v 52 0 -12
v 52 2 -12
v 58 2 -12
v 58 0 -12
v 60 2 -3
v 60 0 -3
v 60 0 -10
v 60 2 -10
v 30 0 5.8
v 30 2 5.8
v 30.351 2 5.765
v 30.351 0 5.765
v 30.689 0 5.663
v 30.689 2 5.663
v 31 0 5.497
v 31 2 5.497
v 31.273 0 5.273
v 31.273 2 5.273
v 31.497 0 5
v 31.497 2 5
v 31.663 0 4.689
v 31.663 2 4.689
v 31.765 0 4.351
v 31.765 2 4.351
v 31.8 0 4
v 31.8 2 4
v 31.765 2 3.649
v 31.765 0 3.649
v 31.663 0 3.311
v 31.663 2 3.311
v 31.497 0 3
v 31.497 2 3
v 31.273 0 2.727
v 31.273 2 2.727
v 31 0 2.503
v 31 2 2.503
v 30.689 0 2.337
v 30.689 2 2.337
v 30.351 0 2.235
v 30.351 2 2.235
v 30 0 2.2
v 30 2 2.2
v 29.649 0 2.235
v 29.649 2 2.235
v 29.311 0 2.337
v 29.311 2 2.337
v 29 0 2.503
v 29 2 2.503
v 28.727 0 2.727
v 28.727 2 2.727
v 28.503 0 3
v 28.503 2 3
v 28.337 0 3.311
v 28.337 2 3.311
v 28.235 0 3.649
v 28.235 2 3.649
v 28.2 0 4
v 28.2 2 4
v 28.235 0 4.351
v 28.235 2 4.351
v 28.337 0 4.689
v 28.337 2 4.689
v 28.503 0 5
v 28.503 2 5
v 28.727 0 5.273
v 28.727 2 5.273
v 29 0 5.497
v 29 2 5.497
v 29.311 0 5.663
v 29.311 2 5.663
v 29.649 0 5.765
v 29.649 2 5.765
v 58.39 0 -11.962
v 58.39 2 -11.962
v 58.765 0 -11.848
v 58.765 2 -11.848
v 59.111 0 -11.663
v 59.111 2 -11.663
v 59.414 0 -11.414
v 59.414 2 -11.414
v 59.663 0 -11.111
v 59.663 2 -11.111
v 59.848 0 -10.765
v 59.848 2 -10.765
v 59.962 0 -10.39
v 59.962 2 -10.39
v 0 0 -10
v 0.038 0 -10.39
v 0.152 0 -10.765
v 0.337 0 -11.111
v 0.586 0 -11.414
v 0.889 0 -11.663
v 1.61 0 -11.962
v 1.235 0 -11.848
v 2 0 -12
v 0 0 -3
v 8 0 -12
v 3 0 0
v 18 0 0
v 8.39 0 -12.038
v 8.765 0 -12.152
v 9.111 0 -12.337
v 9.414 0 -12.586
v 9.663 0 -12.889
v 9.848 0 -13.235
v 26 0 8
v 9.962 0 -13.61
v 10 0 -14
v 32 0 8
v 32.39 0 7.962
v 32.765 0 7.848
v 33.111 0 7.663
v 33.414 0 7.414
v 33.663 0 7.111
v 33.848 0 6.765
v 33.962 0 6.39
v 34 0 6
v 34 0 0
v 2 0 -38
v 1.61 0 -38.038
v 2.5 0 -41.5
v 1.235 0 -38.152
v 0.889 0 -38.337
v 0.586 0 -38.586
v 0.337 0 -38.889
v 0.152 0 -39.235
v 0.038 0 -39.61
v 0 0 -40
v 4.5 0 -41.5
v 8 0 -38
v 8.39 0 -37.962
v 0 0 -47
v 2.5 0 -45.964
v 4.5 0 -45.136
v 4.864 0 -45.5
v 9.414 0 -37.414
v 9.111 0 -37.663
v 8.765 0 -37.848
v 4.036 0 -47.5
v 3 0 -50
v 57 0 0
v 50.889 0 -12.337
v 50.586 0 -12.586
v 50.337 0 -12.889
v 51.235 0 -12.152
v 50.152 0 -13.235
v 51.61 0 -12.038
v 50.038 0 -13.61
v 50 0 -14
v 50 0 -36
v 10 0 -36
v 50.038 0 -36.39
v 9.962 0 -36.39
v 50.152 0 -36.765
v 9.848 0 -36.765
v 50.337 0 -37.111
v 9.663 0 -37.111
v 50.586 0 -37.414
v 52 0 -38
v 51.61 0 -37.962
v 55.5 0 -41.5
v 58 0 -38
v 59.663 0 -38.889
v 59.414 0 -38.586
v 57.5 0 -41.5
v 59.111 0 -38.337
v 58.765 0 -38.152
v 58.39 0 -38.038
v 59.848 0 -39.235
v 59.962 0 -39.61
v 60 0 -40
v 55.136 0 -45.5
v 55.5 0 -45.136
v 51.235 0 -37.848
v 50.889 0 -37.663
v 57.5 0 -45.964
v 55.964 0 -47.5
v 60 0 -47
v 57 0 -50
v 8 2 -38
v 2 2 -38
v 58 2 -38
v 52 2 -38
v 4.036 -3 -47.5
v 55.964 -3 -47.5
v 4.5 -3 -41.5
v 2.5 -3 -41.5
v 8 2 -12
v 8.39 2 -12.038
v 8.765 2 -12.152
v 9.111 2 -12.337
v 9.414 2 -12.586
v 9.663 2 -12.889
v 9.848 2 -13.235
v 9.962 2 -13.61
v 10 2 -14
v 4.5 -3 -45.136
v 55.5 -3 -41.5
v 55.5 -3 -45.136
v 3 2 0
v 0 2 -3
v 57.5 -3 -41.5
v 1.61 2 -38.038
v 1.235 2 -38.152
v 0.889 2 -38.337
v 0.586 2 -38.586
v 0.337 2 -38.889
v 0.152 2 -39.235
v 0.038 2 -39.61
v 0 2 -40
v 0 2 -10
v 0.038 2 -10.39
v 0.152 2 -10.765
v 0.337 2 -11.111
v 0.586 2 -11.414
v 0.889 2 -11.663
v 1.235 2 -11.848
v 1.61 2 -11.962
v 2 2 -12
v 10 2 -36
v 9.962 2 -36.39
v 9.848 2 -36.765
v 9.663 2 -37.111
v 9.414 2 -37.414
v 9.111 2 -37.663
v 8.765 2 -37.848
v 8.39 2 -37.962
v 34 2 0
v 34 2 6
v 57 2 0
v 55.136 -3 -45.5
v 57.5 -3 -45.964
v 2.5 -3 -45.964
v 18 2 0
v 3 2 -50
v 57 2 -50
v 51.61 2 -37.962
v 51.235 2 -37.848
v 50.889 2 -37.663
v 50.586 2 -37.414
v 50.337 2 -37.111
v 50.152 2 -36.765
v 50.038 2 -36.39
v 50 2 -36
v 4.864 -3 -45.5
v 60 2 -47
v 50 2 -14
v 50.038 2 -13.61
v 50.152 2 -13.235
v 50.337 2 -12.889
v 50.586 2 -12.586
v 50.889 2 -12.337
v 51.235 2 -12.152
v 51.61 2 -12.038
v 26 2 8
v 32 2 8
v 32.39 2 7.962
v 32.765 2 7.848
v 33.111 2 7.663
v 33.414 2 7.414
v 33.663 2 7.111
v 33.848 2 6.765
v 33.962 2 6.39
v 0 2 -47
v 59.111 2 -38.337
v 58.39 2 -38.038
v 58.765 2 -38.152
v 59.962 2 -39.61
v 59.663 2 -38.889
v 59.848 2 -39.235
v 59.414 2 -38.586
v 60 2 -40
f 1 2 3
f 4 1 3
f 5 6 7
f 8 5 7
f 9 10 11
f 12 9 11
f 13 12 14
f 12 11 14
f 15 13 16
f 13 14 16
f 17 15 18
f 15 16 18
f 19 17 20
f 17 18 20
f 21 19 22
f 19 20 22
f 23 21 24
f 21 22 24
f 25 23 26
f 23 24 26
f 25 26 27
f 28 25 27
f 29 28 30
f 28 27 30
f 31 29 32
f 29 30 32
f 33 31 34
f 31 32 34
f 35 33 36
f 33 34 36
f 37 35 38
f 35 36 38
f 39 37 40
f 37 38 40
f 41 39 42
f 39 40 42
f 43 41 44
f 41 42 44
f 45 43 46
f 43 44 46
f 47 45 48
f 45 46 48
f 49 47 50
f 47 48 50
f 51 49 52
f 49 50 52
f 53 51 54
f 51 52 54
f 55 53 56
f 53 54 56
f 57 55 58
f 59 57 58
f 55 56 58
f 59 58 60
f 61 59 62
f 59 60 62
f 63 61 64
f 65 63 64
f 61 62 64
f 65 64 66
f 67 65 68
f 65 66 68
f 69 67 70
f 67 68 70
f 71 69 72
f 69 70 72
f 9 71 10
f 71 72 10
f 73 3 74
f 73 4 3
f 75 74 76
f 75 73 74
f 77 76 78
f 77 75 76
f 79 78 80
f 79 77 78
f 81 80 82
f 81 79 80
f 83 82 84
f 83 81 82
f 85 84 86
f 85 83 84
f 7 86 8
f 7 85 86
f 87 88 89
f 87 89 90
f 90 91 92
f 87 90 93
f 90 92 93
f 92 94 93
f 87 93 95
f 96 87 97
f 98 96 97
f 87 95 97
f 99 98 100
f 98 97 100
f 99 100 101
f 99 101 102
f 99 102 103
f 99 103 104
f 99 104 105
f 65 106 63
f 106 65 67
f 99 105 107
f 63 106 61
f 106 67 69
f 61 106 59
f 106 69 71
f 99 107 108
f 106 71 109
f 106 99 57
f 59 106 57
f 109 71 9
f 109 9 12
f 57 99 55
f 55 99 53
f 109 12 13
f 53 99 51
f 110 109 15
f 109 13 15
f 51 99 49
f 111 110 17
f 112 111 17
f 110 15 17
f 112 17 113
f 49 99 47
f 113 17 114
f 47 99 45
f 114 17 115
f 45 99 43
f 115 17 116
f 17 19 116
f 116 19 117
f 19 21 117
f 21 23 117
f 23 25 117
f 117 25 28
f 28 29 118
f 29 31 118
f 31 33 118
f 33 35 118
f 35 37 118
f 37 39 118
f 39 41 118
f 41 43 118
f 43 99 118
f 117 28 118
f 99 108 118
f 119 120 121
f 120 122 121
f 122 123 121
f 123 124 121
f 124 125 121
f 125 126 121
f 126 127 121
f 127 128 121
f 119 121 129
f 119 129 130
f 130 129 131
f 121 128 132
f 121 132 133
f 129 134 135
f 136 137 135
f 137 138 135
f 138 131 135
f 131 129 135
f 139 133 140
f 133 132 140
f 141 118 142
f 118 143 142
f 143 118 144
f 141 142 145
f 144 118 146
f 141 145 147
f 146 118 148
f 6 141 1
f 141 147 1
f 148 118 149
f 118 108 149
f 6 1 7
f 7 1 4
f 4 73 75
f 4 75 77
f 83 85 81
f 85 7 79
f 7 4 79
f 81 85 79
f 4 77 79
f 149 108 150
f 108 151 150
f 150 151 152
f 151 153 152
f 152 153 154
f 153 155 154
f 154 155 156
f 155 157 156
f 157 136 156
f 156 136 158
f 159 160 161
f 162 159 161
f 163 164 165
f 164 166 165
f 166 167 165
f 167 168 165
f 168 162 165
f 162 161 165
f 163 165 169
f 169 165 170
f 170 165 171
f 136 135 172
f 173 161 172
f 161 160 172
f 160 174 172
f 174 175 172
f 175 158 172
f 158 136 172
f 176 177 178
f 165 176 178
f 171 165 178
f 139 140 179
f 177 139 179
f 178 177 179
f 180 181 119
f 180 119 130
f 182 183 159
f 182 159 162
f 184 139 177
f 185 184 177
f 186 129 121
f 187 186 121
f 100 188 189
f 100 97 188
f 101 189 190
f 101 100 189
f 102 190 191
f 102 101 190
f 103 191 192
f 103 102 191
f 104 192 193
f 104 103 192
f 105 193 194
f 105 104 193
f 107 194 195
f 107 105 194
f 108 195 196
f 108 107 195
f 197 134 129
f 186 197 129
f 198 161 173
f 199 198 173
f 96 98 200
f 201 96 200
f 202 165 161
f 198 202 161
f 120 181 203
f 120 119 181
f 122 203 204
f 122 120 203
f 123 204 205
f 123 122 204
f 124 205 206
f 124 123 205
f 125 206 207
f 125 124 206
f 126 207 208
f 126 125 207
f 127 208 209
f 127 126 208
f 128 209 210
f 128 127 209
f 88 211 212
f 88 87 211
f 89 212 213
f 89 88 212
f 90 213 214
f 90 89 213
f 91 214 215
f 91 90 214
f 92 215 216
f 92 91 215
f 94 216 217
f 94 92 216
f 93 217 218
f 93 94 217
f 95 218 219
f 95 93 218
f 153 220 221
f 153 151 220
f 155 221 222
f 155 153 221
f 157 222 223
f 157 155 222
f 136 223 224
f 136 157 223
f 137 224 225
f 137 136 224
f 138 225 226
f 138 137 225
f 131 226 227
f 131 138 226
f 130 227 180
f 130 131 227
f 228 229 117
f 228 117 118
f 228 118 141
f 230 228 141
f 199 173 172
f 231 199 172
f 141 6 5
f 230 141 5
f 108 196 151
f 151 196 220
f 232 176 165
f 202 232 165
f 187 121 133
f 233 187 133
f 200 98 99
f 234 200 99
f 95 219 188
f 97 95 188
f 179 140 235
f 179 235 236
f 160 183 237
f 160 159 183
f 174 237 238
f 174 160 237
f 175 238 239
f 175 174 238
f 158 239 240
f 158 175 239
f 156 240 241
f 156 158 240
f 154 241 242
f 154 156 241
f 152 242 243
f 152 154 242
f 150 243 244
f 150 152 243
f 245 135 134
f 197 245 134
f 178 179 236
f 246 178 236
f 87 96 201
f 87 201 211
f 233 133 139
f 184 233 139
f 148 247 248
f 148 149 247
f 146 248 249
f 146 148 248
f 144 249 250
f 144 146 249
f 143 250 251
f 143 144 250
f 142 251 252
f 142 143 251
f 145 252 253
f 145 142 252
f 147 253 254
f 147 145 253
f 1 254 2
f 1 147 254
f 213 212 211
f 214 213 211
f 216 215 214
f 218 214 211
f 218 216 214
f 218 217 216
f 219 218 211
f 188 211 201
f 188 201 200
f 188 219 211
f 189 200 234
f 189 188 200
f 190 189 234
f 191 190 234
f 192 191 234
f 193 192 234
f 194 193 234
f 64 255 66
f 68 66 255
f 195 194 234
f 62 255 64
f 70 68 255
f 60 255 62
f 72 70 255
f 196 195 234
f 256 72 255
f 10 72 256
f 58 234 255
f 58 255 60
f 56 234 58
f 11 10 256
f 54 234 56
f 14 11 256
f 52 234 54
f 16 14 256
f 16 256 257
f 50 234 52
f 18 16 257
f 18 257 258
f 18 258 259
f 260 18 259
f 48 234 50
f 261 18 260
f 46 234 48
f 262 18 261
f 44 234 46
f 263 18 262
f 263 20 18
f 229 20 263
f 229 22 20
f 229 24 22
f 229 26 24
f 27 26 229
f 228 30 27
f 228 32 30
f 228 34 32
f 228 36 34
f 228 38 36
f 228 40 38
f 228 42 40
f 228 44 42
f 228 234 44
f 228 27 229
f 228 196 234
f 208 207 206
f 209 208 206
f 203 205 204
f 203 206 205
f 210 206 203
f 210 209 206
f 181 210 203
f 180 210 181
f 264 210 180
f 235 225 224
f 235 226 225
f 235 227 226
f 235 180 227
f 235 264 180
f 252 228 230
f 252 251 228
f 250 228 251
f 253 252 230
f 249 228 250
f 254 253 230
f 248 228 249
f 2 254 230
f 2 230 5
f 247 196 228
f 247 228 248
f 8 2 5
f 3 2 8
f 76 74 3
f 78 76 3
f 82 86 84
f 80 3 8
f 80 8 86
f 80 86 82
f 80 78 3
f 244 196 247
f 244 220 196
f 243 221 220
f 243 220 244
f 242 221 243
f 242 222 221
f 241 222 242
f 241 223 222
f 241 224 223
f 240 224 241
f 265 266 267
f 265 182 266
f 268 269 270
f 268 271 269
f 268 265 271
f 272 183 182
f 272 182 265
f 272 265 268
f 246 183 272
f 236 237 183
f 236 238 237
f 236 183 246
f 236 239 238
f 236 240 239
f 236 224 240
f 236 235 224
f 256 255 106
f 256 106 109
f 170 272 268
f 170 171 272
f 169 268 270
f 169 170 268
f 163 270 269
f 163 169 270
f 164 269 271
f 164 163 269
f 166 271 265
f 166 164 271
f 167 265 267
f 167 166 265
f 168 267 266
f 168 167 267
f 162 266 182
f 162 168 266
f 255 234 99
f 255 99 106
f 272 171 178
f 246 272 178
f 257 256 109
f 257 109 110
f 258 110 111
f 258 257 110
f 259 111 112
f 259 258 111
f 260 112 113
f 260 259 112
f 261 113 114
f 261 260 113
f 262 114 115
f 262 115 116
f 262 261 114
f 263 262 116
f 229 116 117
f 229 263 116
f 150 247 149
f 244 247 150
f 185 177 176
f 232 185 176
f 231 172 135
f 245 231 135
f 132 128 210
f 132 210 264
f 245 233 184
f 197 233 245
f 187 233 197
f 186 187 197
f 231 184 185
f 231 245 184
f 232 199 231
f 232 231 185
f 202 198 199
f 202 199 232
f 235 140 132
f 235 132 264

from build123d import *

# Parameters (mm, degrees)
SKETCH1_W           = 60
SKETCH1_H           = 50
BOSS_EXTRUDE1_DEPTH = 2
CHAMFER1_SIZE       = 3
BOSS_EXTRUDE2_DEPTH = 3
SKETCH3_R           = 2
SKETCH3_R_2         = 1.8
BOSS_EXTRUDE3_DEPTH = 2
SKETCH4_W           = 10
SKETCH4_H           = 26
CUT_EXTRUDE1_DEPTH  = 79.262379212
FILLET1_R           = 2


with BuildPart() as part:
    # Sketch1 → Boss-Extrude1 (new body)
    with BuildSketch(Plane(origin=(0, 0, 0), x_dir=(1, 0, 0), z_dir=(0, 1, 0))):
        with Locations((30, 25)):
            Rectangle(SKETCH1_W, SKETCH1_H)
    extrude(amount=BOSS_EXTRUDE1_DEPTH)

    # Chamfer1
    chamfer1_edges = [part.edges().sort_by_distance(p)[0] for p in [
        (0, 1, -50),
        (60, 1, -50),
        (60, 1, 0),
        (0, 1, 0),
    ]]
    chamfer(chamfer1_edges, length=CHAMFER1_SIZE)

    # Sketch2 → Boss-Extrude2 (add)
    with BuildSketch(Plane.XZ):
        Polygon((4.5, -41.5), (2.5, -41.5), (2.5, -45.964466094), (4.035533906, -47.5), (55.964466094, -47.5), (57.5, -45.964466094), (57.5, -41.5), (55.5, -41.5), (55.5, -45.136038969), (55.136038969, -45.5), (4.863961031, -45.5), (4.5, -45.136038969), align=None)
    extrude(amount=BOSS_EXTRUDE2_DEPTH)

    # Sketch3 → Boss-Extrude3 (add)
    # profile 1 of 2: a face of its own
    with BuildSketch(Plane(origin=(0, 2, 0), x_dir=(1, 0, 0), z_dir=(0, 1, 0))):
        with BuildLine():
            Line((18, 0), (26, -8))
            Line((26, -8), (32, -8))
            ThreePointArc((32, -8), (33.414213562, -7.414213562), (34, -6))
            Line((34, -6), (34, 0))
            Line((34, 0), (18, 0))
        make_face()
        with Locations((30, -4)):
            Circle(SKETCH3_R, mode=Mode.SUBTRACT)
    # profile 2 of 2: a face of its own
    with BuildSketch(Plane(origin=(0, 2, 0), x_dir=(1, 0, 0), z_dir=(0, 1, 0))):
        with Locations((30, -4)):
            Circle(SKETCH3_R)
        with Locations(Location((30, -4, 0), (0, 0, 270))):
            Circle(SKETCH3_R_2, mode=Mode.SUBTRACT)
    extrude(amount=-BOSS_EXTRUDE3_DEPTH)

    # Sketch4 → Cut-Extrude1 (cut, through all)
    with BuildSketch(Plane(origin=(0, 2, 0), x_dir=(1, 0, 0), z_dir=(0, 1, 0))):
        with Locations((5, 25)):
            Rectangle(SKETCH4_W, SKETCH4_H)
        with Locations((55, 25)):
            Rectangle(SKETCH4_W, SKETCH4_H)
    extrude(amount=-CUT_EXTRUDE1_DEPTH, mode=Mode.SUBTRACT)

    # Fillet1
    fillet1_edges = [part.edges().sort_by_distance(p)[0] for p in [
        (0, 1, -12),
        (0, 1, -38),
        (10, 1, -38),
        (10, 1, -12),
        (60, 1, -38),
        (60, 1, -12),
        (50, 1, -12),
        (50, 1, -38),
    ]]
    fillet(fillet1_edges, radius=FILLET1_R)


solid = part.part
